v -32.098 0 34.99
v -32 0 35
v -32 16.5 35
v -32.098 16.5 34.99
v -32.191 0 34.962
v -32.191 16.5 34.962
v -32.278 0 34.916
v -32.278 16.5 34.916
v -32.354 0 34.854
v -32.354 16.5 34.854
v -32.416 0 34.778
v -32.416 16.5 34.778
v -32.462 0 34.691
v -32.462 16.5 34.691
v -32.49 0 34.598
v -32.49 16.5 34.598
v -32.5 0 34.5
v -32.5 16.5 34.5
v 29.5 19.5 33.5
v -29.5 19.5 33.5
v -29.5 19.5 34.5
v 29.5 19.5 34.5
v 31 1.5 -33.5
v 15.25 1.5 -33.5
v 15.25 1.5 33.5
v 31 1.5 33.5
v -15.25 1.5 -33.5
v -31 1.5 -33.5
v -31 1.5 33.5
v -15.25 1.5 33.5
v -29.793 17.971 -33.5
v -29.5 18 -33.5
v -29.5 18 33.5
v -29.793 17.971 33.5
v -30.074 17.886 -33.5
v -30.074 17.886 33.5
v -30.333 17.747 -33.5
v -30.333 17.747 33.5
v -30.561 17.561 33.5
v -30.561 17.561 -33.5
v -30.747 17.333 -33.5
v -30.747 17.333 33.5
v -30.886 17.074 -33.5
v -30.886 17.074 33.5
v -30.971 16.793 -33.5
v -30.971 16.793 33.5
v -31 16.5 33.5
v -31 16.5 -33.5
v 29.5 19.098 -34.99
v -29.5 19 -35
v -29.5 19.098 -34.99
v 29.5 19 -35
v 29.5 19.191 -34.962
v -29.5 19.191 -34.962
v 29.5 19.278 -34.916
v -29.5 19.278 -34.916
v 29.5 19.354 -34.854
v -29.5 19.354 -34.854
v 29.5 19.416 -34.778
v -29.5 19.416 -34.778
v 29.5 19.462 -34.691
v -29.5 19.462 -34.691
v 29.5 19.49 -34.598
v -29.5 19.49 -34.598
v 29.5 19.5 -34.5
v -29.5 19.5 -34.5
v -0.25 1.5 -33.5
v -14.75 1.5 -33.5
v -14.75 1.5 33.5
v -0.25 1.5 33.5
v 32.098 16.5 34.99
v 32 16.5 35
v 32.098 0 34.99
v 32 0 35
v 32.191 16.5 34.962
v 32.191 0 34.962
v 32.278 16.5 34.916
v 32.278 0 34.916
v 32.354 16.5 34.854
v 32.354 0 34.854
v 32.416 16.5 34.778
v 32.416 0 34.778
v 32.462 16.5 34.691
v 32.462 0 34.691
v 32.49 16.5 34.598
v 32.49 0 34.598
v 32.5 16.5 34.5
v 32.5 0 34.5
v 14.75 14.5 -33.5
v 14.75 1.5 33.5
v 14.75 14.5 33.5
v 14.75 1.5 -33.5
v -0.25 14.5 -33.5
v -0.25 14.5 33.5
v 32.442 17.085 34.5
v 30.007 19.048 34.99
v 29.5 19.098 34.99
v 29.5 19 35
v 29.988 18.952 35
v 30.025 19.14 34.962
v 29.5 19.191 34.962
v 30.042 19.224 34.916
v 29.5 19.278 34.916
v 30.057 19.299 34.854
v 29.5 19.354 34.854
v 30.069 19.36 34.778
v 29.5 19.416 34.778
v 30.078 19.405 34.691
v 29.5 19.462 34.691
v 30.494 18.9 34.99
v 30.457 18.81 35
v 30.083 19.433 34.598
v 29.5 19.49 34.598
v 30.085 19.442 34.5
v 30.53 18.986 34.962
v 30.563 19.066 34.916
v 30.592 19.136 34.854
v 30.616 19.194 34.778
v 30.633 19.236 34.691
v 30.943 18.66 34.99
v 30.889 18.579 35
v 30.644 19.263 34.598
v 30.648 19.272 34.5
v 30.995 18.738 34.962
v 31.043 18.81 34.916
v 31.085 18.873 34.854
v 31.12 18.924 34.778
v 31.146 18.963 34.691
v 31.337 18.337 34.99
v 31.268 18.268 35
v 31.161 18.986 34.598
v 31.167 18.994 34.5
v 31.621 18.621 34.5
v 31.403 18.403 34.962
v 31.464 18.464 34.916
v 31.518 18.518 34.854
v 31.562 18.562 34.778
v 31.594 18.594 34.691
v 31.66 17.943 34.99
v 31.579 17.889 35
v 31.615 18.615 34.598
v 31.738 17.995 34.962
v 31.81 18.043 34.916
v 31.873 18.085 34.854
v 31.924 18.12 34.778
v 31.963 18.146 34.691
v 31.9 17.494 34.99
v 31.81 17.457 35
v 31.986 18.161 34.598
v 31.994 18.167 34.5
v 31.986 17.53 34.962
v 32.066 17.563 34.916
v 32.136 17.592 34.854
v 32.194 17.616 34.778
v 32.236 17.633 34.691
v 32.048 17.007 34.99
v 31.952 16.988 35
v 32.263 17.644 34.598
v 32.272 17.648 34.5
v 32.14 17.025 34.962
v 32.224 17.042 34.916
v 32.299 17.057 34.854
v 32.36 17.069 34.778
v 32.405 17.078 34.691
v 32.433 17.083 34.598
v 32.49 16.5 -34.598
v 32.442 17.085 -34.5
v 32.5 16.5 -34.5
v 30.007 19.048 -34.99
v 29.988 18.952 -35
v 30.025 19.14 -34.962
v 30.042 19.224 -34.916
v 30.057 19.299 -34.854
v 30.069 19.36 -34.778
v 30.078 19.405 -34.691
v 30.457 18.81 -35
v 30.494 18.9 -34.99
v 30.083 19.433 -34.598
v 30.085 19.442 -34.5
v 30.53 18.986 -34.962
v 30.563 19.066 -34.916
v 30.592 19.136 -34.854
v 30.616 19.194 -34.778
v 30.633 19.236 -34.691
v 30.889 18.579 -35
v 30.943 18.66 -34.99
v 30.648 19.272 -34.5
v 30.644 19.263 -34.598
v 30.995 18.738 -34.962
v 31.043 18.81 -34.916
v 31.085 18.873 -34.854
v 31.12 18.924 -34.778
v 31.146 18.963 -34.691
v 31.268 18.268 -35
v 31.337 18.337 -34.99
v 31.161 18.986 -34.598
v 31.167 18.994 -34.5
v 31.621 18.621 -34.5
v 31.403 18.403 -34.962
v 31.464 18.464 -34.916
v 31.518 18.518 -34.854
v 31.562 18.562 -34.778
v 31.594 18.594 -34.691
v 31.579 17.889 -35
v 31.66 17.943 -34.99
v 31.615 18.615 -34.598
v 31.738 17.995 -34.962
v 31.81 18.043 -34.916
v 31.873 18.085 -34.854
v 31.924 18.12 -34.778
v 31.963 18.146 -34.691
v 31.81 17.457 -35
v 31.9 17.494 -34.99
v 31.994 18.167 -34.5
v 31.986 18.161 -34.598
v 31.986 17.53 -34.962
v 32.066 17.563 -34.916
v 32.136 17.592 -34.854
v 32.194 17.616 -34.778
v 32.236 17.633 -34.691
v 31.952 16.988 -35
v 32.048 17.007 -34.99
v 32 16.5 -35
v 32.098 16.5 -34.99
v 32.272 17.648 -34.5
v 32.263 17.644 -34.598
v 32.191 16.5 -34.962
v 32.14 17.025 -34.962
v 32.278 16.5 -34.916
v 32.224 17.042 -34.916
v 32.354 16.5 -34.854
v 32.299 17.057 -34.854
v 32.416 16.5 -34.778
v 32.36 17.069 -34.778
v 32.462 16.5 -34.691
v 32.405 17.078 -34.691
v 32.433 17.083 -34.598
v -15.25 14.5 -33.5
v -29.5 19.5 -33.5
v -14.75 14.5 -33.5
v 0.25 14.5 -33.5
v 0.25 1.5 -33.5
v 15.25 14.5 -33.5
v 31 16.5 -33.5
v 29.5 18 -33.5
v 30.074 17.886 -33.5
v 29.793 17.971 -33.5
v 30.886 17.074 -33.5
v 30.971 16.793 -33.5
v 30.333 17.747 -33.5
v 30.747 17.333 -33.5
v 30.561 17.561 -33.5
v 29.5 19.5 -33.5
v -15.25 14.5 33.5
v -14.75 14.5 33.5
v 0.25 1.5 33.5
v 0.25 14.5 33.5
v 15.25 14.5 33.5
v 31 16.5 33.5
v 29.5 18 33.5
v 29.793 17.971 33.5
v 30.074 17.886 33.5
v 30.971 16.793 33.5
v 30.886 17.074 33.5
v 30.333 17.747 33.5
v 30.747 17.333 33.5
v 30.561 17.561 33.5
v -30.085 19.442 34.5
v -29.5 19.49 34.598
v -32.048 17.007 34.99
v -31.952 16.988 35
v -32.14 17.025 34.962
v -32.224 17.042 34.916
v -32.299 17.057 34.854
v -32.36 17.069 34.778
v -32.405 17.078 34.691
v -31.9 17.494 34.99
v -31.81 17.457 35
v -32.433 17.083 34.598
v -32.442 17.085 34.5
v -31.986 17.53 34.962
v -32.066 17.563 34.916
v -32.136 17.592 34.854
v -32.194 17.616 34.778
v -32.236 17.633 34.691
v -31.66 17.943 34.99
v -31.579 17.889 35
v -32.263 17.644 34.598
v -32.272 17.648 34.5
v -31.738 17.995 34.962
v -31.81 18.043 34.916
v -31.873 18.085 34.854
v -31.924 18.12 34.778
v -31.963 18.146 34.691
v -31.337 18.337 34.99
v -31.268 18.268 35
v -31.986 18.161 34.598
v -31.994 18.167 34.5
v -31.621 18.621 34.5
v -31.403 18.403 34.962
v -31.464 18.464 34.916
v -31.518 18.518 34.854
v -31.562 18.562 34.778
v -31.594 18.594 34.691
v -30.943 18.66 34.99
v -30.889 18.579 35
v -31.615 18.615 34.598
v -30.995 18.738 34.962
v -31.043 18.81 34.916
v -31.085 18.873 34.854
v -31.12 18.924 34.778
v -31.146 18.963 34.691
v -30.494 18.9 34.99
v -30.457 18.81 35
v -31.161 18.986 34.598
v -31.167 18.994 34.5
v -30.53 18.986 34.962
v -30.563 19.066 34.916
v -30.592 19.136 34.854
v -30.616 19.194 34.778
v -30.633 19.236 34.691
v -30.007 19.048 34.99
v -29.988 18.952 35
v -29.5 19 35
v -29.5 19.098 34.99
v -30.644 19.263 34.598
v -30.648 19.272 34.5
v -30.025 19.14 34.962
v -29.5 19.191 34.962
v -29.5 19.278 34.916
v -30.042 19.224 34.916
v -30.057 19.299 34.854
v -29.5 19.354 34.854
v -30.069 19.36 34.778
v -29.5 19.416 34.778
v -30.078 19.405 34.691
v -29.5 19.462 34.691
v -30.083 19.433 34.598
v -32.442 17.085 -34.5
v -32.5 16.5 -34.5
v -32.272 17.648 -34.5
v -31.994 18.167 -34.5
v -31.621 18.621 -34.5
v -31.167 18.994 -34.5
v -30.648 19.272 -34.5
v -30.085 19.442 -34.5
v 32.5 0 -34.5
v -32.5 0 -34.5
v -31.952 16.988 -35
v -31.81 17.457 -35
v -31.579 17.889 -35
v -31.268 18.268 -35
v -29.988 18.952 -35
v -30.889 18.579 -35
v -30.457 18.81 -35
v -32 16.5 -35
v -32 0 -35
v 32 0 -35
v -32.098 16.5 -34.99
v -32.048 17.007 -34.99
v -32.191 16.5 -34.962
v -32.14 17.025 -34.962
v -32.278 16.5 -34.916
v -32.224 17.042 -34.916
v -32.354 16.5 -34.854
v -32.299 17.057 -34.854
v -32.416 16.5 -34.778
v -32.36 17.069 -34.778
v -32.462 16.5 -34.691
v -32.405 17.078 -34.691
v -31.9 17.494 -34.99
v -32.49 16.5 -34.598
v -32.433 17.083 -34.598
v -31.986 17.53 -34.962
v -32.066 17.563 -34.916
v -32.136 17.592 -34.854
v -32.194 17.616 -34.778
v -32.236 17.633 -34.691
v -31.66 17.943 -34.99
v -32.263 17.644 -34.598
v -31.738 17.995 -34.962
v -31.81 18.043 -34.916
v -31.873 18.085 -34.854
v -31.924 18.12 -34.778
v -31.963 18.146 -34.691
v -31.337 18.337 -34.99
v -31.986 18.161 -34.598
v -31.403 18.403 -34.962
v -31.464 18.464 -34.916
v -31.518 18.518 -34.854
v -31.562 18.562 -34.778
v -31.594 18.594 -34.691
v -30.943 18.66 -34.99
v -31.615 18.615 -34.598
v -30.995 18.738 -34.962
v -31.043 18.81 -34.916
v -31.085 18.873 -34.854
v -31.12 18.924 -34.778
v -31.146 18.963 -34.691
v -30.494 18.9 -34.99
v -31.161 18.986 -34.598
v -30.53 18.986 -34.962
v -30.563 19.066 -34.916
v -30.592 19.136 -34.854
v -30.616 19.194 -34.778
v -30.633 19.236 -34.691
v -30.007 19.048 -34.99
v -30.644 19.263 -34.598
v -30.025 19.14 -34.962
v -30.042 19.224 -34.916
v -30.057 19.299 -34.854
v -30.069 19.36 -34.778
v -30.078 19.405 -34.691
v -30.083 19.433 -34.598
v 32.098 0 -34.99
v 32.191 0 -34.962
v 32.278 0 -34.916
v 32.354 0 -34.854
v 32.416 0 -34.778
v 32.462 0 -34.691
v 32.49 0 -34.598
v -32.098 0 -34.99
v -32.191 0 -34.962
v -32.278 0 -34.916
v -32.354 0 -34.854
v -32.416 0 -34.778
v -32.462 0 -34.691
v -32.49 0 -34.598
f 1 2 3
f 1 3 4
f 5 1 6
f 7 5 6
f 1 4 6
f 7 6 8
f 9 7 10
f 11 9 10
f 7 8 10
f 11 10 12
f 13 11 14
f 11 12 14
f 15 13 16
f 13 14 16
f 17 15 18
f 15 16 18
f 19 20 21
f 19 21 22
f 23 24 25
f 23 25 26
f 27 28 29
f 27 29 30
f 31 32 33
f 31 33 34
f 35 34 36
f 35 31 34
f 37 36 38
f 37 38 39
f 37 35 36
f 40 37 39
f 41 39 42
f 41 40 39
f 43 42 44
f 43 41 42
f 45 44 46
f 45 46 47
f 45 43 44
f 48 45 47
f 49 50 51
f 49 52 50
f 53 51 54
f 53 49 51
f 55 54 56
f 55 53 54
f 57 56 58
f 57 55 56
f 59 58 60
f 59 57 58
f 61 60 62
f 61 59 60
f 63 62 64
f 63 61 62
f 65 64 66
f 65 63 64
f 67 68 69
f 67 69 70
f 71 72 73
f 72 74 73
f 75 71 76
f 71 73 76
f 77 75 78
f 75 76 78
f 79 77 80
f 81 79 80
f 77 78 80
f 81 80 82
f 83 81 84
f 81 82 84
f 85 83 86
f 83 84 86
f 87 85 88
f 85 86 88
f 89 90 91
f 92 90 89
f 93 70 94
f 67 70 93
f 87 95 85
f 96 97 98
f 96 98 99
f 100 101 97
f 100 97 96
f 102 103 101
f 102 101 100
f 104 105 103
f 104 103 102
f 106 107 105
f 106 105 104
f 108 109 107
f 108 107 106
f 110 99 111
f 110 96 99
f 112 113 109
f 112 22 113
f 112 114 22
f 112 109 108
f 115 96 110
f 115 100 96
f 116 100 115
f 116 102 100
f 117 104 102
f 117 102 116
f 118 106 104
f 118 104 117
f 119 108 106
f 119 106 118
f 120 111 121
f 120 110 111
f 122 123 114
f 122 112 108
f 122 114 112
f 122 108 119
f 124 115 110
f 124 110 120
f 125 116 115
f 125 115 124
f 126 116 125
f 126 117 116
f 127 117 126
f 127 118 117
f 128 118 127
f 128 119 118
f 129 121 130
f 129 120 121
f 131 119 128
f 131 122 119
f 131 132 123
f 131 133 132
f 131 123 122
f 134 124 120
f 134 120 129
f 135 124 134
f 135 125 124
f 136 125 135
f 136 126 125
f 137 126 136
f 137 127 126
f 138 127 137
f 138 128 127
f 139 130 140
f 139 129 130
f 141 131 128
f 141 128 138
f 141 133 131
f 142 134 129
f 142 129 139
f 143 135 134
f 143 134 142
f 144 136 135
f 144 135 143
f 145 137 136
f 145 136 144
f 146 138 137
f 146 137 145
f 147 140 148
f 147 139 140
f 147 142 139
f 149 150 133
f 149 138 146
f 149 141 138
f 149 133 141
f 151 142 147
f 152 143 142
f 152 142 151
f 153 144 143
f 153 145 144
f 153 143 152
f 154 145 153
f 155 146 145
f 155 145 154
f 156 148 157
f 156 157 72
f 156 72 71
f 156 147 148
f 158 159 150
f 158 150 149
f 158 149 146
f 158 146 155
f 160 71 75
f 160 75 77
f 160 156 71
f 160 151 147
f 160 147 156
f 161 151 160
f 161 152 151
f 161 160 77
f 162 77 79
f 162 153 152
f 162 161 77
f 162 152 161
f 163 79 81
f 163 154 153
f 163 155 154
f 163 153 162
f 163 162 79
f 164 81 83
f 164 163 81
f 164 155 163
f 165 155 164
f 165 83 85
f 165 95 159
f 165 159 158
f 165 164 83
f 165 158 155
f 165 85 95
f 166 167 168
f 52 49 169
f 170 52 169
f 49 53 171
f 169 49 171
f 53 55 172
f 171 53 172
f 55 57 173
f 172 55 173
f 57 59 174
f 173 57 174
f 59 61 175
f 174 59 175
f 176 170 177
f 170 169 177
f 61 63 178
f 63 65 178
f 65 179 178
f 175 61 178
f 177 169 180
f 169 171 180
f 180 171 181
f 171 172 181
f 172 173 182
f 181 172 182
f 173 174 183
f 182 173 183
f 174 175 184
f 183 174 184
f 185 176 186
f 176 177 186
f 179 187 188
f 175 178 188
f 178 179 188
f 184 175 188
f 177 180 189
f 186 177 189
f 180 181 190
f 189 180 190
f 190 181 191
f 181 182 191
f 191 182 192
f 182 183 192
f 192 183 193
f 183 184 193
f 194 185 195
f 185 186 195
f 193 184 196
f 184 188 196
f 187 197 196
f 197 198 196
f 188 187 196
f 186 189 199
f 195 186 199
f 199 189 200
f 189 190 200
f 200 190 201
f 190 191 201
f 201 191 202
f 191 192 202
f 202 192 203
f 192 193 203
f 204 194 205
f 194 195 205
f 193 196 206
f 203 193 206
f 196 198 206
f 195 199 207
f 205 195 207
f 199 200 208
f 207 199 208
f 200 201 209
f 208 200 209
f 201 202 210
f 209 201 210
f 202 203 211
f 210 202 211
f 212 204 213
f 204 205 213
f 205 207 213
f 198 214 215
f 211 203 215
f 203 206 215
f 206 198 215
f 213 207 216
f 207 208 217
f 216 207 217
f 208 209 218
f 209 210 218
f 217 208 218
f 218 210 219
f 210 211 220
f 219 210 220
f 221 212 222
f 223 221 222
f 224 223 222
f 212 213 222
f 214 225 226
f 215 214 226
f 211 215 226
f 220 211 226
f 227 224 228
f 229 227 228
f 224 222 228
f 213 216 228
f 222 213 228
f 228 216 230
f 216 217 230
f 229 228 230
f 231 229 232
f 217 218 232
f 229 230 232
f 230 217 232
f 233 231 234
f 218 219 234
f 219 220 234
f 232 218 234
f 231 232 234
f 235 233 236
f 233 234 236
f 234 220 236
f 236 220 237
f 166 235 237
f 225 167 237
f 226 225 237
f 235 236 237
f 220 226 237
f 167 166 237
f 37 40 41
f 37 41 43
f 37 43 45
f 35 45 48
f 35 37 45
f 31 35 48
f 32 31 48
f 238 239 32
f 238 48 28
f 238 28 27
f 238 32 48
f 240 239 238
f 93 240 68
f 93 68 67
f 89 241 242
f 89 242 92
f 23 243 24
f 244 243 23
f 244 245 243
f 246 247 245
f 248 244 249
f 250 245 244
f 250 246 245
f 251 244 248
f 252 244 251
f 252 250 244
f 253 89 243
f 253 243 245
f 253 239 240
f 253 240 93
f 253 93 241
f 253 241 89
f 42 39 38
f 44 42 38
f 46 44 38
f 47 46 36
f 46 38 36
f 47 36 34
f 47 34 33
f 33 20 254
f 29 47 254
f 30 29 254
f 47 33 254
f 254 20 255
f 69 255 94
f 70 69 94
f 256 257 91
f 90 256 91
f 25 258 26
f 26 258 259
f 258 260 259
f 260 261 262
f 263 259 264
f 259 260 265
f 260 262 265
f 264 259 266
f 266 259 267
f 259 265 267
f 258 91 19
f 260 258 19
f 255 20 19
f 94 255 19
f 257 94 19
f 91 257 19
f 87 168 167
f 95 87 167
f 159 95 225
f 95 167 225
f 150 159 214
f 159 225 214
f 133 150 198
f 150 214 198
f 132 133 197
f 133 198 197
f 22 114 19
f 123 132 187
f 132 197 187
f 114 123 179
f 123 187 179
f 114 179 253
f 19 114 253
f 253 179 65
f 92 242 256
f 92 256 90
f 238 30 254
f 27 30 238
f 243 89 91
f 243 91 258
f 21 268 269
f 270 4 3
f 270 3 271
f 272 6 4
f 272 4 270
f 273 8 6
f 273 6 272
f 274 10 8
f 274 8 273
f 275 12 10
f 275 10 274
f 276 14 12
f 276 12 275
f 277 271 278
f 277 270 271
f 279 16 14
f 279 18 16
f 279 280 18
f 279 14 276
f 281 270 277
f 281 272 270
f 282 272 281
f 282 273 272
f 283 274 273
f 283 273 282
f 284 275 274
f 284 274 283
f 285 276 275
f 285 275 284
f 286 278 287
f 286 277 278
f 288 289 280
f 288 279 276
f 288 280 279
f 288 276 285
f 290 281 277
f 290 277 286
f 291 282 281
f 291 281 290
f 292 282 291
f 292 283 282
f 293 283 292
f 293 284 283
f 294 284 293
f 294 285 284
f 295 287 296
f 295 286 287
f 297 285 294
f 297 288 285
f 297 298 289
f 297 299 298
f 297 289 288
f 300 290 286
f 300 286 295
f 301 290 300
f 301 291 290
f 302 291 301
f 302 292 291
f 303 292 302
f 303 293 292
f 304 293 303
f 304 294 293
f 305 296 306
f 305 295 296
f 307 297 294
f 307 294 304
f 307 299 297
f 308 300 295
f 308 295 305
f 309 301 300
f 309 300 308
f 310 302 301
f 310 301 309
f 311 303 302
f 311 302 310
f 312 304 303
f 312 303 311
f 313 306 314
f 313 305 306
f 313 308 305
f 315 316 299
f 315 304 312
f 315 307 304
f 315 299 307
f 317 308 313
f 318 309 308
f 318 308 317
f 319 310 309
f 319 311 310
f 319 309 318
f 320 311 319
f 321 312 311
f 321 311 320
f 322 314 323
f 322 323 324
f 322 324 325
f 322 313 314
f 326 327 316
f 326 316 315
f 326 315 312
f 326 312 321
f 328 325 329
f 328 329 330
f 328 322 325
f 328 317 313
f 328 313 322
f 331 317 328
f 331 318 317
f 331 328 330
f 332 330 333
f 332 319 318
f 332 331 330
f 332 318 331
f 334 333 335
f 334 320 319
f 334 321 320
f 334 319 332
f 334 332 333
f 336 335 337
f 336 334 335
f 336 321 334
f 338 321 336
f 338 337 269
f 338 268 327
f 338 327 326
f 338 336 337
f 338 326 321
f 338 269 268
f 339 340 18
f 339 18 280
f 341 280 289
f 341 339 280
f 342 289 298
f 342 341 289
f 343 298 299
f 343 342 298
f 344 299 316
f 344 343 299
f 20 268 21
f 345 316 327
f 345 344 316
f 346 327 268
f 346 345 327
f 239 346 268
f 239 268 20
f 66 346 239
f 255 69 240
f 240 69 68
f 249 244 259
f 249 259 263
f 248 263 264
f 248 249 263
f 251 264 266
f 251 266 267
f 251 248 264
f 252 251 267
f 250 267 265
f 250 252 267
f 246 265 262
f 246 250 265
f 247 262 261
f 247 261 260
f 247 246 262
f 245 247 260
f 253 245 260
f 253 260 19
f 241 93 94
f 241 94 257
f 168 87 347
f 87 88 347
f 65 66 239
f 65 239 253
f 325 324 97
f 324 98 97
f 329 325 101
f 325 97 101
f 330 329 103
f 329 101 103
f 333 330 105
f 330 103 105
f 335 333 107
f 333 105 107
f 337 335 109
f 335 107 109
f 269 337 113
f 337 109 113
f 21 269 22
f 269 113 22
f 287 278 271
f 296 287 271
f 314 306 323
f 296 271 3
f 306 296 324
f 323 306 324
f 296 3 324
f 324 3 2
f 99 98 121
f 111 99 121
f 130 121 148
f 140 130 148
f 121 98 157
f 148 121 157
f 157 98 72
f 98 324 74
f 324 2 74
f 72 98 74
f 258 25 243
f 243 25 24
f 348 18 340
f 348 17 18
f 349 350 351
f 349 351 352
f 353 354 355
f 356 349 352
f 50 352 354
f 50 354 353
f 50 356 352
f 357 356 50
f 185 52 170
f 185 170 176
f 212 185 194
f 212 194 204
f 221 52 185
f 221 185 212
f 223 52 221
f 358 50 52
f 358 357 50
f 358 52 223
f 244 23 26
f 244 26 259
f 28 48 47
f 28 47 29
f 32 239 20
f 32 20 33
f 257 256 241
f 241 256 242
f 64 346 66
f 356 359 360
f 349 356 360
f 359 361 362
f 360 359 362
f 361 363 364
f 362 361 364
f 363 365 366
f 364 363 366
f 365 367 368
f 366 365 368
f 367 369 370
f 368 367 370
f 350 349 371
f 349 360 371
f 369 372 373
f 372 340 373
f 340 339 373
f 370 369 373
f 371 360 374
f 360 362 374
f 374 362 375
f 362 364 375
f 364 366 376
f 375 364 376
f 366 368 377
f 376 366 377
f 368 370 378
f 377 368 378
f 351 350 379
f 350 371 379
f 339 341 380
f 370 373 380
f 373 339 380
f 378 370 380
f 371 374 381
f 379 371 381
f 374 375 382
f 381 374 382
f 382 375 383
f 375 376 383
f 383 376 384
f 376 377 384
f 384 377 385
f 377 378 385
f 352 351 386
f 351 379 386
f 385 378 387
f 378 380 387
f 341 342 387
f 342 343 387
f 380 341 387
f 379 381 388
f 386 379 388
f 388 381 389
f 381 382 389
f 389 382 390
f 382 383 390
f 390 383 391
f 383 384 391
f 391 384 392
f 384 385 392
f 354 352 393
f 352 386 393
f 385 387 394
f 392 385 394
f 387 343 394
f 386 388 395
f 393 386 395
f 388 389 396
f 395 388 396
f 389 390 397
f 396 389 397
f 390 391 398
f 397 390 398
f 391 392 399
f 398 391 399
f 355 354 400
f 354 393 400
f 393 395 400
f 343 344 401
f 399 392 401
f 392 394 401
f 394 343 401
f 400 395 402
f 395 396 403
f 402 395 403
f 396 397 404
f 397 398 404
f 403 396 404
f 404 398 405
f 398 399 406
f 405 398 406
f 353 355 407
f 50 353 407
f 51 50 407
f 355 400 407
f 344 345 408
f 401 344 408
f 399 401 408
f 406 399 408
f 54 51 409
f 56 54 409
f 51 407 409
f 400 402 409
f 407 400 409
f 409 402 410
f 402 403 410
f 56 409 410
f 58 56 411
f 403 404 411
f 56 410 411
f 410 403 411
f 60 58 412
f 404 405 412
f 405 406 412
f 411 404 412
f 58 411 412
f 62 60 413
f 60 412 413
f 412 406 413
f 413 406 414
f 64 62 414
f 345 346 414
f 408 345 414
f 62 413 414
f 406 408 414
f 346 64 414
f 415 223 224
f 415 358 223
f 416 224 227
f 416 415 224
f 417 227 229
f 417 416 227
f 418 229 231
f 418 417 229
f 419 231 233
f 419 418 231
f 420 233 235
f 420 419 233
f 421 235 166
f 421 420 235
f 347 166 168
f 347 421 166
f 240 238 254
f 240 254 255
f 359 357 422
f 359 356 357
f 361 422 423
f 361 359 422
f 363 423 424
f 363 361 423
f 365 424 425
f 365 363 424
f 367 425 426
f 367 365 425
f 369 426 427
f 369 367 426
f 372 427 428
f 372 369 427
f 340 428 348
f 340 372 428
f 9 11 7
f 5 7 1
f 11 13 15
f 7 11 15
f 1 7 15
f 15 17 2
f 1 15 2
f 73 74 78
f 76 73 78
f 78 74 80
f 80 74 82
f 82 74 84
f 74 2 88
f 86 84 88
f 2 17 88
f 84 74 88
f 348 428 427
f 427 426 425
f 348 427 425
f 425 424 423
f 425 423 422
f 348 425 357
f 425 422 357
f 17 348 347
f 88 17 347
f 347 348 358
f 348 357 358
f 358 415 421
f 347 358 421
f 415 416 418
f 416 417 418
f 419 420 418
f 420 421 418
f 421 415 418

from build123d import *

# Parameters (mm, degrees)
SKETCH1_W           = 65
SKETCH1_H           = 70
BOSS_EXTRUDE1_DEPTH = 19.5
FILLET1_R           = 3
FILLET2_R           = 0.5
SHELL1_START        = -33.5
SHELL1_DEPTH        = 67
SKETCH2_W           = 0.5
SKETCH2_H           = 67
EXTRUDE_THIN1_DEPTH = 13
LPATTERN1_COUNT     = 2
LPATTERN1_PITCH     = 15
LPATTERN1_COL_COUNT = 2
LPATTERN1_COL_PITCH = 15


# Read off the part's stored shape, not the designer's step: Shell1
with BuildPart() as part:
    # Sketch1 → Boss-Extrude1 (new body)
    with BuildSketch(Plane(origin=(0, 0, 0), x_dir=(1, 0, 0), z_dir=(0, 1, 0))):
        Rectangle(SKETCH1_W, SKETCH1_H)
    extrude(amount=BOSS_EXTRUDE1_DEPTH)

    # Fillet1
    fillet1_edges = [part.edges().sort_by_distance(p)[0] for p in [
        (32.5, 19.5, 0),
        (-32.5, 19.5, 0),
    ]]
    fillet(fillet1_edges, radius=FILLET1_R)

    # Fillet2
    fillet2_edges = [part.edges().sort_by_distance(p)[0] for p in [
        (0, 19.5, 35),
        (0, 19.5, -35),
        (-32.5, 8.25, -35),
        (32.5, 8.25, -35),
        (-31.621320344, 18.621320344, -35),
        (31.621320344, 18.621320344, -35),
        (32.5, 8.25, 35),
        (-32.5, 8.25, 35),
        (-31.621320344, 18.621320344, 35),
        (31.621320344, 18.621320344, 35),
    ]]
    fillet(fillet2_edges, radius=FILLET2_R)

    # Shell1 outline → Shell1 (cut)
    with BuildSketch(Plane.XY.offset(SHELL1_START)):
        with BuildLine():
            Line((29.5, 18), (29.5, 19.5))
            Line((29.5, 19.5), (-29.5, 19.5))
            Line((-29.5, 19.5), (-29.5, 18))
            ThreePointArc((-29.5, 18), (-30.560660172, 17.560660172), (-31, 16.5))
            Line((-31, 16.5), (-31, 1.5))
            Line((-31, 1.5), (31, 1.5))
            Line((31, 1.5), (31, 16.5))
            ThreePointArc((31, 16.5), (30.560660172, 17.560660172), (29.5, 18))
        make_face()
    extrude(amount=SHELL1_DEPTH, mode=Mode.SUBTRACT)

    # Sketch2 → Extrude-Thin1 (add)
    with BuildSketch(Plane(origin=(0, 1.5, 0), x_dir=(1, 0, 0), z_dir=(0, 1, 0))):
        Rectangle(SKETCH2_W, SKETCH2_H)
    extrude_thin1 = extrude(amount=EXTRUDE_THIN1_DEPTH)

    # LPattern1: Extrude-Thin1 ×2
    with Locations(*[(-i * LPATTERN1_PITCH, 0, 0) for i in range(1, LPATTERN1_COUNT)]):
        add(extrude_thin1)

    # LPattern1 col: Extrude-Thin1 ×2
    with Locations(*[(i * LPATTERN1_COL_PITCH, 0, 0) for i in range(1, LPATTERN1_COL_COUNT)]):
        add(extrude_thin1)


solid = part.part
